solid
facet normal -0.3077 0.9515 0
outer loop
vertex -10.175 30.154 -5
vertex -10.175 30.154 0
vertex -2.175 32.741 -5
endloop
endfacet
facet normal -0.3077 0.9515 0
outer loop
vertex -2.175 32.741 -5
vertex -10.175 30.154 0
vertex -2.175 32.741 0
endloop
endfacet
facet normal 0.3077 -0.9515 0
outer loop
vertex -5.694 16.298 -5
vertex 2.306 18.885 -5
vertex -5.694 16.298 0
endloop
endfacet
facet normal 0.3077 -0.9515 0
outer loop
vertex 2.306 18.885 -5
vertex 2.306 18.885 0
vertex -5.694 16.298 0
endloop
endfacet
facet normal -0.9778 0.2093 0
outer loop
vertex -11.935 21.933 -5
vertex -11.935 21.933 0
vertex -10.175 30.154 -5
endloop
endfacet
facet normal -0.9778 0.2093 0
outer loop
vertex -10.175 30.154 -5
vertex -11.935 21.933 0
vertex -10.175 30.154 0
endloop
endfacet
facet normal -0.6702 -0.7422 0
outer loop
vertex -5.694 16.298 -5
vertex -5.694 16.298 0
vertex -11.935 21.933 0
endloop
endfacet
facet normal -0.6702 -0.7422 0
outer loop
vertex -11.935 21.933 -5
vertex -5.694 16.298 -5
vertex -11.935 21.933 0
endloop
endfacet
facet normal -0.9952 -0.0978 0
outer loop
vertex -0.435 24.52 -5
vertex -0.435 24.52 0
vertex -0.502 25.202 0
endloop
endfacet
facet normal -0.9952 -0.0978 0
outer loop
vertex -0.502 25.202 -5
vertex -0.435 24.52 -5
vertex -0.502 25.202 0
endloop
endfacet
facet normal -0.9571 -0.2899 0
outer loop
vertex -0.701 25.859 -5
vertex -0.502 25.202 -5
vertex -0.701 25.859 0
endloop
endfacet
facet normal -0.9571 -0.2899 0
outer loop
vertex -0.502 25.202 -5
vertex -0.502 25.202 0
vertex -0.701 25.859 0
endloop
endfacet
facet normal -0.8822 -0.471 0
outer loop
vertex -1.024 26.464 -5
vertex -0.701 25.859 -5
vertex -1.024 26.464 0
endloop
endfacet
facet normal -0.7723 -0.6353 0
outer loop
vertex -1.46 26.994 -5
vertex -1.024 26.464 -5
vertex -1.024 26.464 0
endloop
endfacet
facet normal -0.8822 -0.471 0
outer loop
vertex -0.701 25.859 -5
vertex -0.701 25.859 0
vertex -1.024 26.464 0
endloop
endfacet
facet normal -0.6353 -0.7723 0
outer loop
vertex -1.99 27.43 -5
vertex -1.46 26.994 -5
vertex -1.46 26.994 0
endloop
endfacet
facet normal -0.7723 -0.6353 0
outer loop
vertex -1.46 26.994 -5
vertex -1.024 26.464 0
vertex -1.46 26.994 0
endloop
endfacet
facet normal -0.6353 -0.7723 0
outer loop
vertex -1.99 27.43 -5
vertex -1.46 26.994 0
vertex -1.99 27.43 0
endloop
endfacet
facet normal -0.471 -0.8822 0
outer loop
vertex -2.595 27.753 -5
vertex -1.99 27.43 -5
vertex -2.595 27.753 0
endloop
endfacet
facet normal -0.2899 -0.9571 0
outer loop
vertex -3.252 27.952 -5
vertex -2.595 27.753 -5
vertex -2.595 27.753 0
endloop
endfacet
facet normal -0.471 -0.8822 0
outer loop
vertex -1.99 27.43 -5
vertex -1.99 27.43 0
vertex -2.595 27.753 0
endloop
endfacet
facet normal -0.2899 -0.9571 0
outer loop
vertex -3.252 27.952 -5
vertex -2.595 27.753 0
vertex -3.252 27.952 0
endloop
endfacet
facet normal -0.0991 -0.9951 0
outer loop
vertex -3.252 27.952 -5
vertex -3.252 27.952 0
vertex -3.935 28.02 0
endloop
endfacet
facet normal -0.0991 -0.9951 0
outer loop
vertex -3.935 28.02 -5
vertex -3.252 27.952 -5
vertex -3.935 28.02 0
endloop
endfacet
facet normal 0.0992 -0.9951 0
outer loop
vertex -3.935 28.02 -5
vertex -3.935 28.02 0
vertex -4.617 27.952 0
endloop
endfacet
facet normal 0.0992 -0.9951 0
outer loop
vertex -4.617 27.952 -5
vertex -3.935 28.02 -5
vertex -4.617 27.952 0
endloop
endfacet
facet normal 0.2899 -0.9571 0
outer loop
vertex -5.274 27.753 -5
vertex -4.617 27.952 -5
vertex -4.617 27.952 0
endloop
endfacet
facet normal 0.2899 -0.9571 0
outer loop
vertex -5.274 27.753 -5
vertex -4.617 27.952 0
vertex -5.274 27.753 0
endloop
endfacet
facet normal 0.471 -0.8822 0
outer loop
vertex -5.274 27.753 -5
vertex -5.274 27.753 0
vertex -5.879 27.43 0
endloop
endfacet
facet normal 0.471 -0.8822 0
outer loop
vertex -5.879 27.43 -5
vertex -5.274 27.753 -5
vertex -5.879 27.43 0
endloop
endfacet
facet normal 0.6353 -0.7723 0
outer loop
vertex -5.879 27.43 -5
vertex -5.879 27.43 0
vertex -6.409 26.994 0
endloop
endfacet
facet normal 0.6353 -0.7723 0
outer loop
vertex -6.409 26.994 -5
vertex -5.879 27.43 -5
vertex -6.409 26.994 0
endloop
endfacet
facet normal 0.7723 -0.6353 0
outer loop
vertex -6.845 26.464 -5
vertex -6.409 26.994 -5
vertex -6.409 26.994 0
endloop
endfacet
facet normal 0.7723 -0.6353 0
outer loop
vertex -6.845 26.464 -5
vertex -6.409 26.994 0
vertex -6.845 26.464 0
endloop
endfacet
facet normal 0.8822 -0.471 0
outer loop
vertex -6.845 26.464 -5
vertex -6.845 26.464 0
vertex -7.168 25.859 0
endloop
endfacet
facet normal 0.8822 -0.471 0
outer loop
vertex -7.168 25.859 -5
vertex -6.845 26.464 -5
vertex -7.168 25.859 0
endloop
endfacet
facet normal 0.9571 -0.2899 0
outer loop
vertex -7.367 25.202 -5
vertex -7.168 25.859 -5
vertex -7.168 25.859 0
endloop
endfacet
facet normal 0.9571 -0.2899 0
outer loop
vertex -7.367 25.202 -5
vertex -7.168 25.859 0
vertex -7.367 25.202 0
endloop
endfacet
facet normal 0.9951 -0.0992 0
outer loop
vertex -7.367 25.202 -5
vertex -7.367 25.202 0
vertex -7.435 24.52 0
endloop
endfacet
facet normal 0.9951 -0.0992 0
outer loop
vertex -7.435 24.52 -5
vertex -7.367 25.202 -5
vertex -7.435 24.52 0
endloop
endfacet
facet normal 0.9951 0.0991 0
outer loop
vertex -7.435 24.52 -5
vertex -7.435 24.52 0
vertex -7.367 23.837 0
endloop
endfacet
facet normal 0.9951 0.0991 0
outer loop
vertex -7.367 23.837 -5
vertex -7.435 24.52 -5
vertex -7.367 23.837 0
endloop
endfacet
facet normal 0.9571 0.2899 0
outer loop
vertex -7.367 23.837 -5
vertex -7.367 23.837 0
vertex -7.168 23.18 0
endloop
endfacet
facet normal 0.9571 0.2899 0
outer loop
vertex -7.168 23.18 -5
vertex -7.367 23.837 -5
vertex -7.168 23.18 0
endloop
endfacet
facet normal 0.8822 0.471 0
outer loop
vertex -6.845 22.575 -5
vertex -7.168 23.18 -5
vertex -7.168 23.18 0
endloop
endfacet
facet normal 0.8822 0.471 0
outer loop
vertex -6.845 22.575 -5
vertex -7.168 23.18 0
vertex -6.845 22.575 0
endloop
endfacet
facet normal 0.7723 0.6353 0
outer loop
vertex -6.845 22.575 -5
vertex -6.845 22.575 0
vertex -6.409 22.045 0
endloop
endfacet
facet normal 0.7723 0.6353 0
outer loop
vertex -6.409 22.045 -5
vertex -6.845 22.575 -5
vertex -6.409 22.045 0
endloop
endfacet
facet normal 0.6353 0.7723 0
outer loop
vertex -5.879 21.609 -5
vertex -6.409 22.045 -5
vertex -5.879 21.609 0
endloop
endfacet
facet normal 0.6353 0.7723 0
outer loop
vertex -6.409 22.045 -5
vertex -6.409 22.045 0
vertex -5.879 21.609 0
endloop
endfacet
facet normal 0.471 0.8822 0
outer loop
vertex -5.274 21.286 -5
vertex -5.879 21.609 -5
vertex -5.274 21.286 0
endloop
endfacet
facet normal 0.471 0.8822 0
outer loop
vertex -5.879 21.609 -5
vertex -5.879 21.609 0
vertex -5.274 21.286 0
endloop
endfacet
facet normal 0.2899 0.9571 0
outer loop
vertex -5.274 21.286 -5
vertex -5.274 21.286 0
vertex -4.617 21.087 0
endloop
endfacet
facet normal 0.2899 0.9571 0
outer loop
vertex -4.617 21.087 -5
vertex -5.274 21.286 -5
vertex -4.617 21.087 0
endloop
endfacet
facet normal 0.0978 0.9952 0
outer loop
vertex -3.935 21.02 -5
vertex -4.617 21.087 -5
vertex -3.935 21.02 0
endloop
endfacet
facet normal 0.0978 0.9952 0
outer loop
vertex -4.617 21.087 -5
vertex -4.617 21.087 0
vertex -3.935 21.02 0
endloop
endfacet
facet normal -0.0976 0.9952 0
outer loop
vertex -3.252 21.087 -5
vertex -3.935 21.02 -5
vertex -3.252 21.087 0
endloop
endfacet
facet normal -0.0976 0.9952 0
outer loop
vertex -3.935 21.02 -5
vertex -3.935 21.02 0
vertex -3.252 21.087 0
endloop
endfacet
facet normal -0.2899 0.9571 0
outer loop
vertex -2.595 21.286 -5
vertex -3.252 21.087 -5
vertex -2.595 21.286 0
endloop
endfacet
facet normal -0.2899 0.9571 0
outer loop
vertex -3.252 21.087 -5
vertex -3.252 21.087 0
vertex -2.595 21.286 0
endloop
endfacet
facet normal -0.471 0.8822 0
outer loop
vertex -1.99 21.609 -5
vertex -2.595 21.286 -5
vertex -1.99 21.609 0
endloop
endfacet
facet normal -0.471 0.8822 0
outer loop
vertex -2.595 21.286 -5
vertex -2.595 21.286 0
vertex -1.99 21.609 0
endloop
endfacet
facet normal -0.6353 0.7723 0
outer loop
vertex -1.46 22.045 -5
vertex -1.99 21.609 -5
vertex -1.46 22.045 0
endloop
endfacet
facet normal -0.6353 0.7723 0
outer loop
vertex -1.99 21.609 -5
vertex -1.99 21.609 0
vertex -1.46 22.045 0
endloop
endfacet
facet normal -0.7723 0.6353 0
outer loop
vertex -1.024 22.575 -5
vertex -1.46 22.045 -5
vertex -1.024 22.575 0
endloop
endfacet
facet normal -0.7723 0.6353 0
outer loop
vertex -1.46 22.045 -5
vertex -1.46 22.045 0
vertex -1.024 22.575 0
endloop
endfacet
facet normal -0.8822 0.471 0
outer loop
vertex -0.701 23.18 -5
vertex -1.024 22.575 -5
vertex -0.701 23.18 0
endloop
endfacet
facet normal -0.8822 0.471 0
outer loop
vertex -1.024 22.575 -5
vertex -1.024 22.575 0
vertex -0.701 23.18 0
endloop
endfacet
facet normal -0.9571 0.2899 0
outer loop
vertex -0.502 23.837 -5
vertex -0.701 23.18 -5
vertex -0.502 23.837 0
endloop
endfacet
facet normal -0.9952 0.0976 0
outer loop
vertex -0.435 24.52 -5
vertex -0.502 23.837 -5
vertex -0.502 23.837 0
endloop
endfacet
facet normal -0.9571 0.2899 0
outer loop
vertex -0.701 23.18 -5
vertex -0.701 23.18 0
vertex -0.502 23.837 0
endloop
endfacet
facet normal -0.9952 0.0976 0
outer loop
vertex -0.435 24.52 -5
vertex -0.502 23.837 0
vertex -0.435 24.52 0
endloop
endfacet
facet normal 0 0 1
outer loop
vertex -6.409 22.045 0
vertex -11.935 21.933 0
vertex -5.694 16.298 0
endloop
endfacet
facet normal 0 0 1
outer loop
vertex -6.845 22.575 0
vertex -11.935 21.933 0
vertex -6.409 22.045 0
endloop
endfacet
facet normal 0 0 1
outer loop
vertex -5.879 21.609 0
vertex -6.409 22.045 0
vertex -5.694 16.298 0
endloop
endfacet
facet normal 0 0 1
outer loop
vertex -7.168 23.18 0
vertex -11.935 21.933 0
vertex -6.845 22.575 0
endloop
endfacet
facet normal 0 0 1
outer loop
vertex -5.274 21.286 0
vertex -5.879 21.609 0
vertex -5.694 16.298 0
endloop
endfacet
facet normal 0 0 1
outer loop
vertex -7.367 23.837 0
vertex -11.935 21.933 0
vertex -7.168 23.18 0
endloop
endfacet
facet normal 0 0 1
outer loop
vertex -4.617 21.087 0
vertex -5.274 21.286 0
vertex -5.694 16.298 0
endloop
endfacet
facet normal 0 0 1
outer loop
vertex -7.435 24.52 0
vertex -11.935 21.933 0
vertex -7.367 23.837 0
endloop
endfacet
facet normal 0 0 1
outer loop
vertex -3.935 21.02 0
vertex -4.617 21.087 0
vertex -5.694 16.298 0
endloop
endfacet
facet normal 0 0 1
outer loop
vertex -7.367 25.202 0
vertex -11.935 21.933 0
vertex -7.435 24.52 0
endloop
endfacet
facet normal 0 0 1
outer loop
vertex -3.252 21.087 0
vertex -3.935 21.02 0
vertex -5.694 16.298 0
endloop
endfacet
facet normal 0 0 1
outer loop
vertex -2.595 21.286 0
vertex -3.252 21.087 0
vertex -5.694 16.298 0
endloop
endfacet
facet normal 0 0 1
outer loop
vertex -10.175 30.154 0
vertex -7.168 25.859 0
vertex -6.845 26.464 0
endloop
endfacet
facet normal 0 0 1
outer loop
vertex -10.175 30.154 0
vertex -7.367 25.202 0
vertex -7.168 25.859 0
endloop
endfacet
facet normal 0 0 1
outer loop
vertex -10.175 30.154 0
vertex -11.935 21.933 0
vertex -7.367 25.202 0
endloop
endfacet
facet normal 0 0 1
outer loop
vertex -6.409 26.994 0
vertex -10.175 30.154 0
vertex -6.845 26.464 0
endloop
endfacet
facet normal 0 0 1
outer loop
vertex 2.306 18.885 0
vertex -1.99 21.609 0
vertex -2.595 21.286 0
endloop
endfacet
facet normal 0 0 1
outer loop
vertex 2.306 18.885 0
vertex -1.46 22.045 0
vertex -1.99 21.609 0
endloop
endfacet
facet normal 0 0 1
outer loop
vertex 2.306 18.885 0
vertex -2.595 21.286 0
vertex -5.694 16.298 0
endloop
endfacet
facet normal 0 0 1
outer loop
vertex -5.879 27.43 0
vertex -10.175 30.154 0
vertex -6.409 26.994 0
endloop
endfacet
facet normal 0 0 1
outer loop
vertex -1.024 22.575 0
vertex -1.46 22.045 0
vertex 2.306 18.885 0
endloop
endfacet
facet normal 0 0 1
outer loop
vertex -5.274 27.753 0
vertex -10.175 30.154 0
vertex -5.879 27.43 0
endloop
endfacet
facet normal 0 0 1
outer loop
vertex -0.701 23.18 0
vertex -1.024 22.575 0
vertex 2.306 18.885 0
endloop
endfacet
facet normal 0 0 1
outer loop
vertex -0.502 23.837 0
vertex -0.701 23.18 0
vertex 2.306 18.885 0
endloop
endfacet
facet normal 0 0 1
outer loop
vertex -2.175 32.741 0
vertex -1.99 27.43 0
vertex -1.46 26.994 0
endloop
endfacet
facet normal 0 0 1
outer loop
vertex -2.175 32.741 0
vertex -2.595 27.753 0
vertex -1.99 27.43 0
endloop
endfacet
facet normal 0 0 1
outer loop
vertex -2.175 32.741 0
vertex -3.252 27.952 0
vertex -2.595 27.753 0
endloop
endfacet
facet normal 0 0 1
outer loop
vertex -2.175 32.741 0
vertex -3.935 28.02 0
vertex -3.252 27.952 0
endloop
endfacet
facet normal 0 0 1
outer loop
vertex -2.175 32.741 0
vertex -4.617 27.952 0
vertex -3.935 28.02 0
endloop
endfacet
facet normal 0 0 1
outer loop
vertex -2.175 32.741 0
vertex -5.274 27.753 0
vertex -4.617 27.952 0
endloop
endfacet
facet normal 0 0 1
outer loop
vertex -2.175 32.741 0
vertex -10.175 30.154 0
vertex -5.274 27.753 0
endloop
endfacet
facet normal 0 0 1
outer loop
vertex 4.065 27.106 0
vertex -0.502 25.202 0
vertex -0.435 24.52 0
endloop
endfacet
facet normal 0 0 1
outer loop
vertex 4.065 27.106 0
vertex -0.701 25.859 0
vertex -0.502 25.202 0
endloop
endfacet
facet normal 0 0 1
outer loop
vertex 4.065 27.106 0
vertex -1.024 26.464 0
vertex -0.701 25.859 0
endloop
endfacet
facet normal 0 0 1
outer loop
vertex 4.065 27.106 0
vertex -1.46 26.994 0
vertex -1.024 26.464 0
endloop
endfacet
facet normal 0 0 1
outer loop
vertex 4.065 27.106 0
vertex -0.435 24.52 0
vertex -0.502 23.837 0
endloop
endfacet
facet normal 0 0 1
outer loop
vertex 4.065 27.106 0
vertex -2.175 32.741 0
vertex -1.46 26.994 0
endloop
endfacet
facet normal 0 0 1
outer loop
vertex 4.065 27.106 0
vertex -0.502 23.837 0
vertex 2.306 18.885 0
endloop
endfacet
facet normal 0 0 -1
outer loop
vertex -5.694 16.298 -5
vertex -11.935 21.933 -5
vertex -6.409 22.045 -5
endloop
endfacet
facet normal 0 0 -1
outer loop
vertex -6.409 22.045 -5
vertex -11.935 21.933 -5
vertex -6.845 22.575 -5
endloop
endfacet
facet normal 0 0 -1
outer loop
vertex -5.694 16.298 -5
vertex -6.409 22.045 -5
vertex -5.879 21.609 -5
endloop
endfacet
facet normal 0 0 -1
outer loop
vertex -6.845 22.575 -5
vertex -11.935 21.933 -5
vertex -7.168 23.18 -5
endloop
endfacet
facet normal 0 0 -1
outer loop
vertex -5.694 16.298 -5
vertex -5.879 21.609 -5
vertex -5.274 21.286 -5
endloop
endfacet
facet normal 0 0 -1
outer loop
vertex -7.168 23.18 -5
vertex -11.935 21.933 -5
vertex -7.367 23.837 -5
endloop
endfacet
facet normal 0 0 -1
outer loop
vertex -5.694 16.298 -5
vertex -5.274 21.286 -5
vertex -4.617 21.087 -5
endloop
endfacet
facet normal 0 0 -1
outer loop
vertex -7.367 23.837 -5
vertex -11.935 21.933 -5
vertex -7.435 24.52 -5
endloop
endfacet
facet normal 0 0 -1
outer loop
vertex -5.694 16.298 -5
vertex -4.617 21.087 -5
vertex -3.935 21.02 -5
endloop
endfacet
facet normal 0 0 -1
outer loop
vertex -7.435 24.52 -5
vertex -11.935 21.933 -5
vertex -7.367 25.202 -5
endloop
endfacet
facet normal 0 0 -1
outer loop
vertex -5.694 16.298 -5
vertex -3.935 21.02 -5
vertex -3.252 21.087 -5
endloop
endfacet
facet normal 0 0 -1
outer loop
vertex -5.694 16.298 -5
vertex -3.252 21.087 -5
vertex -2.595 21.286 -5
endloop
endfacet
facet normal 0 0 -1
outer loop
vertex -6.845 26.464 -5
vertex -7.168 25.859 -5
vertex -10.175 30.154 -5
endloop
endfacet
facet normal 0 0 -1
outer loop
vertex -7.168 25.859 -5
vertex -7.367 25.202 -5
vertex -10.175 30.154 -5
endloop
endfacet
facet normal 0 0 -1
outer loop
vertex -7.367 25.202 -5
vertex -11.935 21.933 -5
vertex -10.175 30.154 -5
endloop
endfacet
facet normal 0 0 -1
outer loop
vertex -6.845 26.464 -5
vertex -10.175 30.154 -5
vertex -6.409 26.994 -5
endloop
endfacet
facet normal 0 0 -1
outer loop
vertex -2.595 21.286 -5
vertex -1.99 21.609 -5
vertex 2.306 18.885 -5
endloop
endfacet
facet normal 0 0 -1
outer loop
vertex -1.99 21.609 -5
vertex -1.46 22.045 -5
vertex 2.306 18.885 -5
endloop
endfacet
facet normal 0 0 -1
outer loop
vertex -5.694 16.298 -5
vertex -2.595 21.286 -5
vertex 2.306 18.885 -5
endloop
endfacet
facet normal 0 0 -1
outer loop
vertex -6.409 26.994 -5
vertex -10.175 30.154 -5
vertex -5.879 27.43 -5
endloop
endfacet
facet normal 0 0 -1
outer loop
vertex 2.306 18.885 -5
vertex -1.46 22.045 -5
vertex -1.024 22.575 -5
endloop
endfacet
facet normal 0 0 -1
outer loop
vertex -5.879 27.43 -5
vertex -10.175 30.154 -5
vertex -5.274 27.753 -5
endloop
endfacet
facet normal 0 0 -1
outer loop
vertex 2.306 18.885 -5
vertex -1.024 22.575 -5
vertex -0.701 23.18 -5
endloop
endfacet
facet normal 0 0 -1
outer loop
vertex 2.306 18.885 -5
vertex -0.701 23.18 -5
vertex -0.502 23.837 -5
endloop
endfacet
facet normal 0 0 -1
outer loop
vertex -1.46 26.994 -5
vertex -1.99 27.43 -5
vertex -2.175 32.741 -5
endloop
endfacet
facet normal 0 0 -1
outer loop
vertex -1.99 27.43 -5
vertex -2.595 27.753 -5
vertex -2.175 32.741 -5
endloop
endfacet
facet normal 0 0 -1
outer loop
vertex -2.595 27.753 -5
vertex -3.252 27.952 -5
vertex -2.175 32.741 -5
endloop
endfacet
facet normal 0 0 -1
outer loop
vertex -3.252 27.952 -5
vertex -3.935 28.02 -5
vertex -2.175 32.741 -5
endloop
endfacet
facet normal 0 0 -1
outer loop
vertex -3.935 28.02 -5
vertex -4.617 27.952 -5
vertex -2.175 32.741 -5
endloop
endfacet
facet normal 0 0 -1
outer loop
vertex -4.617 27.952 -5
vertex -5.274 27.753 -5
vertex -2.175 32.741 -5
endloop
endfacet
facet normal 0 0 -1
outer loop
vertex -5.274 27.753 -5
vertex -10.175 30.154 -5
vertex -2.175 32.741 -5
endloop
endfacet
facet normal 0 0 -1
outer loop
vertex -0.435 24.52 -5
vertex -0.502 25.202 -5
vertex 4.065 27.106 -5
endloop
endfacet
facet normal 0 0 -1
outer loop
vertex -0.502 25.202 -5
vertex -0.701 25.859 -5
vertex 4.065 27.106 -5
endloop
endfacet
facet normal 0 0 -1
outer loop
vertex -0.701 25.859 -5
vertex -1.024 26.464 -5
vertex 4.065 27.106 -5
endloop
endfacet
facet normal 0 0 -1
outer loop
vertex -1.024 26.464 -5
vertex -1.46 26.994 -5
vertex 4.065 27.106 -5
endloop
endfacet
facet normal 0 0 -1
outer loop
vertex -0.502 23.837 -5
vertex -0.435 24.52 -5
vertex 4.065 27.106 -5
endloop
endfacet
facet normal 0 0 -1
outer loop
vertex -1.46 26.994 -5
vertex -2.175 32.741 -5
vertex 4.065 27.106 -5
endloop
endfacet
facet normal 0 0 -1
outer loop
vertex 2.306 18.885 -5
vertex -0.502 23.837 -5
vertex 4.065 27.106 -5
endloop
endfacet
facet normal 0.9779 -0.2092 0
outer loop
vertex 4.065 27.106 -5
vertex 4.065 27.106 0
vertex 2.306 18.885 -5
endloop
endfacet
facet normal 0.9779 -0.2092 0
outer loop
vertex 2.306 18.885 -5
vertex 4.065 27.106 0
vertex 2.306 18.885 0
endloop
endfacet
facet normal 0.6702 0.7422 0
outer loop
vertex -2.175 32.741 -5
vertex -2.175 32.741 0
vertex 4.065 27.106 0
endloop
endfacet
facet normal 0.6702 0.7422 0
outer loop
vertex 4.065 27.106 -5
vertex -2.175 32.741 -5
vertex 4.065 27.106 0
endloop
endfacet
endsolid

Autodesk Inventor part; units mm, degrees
ref_plane "YZ Plane" through (0, 0, 0) normal (1, 0, 0) x (0, 1, 0)
ref_plane "XZ Plane" through (0, 0, 0) normal (0, 1, 0) x (-1, 0, 0)
ref_plane "XY Plane" through (0, 0, 0) normal (0, 0, 1) x (1, 0, 0)
sketch "Sketch1" plane through (0, 0, 0) normal (0, 0, 1) x (1, 0, 0)
  line L0 (4.0654, 27.1063) -> (2.3055, 18.8848)
  line L1 (2.3055, 18.8848) -> (-5.6945, 16.2981)
  line L2 (-5.6945, 16.2981) -> (-11.9346, 21.933)
  line L3 (-11.9346, 21.933) -> (-10.1748, 30.1545)
  line L4 (-10.1748, 30.1545) -> (-2.1748, 32.7412)
  line L5 (-2.1748, 32.7412) -> (4.0654, 27.1063)
  circle A0 centre (-3.9346, 24.5196) radius 3.5
extrude "Extrusion4" add sketch "Sketch1" against normal blind 5
sketch "Sketch2" plane through (0, 0, 0) normal (0, 0, 1) x (1, 0, 0)
  point P0 (0, 0)
properties part number "gaica" material "Bronze, Soft Tin"
